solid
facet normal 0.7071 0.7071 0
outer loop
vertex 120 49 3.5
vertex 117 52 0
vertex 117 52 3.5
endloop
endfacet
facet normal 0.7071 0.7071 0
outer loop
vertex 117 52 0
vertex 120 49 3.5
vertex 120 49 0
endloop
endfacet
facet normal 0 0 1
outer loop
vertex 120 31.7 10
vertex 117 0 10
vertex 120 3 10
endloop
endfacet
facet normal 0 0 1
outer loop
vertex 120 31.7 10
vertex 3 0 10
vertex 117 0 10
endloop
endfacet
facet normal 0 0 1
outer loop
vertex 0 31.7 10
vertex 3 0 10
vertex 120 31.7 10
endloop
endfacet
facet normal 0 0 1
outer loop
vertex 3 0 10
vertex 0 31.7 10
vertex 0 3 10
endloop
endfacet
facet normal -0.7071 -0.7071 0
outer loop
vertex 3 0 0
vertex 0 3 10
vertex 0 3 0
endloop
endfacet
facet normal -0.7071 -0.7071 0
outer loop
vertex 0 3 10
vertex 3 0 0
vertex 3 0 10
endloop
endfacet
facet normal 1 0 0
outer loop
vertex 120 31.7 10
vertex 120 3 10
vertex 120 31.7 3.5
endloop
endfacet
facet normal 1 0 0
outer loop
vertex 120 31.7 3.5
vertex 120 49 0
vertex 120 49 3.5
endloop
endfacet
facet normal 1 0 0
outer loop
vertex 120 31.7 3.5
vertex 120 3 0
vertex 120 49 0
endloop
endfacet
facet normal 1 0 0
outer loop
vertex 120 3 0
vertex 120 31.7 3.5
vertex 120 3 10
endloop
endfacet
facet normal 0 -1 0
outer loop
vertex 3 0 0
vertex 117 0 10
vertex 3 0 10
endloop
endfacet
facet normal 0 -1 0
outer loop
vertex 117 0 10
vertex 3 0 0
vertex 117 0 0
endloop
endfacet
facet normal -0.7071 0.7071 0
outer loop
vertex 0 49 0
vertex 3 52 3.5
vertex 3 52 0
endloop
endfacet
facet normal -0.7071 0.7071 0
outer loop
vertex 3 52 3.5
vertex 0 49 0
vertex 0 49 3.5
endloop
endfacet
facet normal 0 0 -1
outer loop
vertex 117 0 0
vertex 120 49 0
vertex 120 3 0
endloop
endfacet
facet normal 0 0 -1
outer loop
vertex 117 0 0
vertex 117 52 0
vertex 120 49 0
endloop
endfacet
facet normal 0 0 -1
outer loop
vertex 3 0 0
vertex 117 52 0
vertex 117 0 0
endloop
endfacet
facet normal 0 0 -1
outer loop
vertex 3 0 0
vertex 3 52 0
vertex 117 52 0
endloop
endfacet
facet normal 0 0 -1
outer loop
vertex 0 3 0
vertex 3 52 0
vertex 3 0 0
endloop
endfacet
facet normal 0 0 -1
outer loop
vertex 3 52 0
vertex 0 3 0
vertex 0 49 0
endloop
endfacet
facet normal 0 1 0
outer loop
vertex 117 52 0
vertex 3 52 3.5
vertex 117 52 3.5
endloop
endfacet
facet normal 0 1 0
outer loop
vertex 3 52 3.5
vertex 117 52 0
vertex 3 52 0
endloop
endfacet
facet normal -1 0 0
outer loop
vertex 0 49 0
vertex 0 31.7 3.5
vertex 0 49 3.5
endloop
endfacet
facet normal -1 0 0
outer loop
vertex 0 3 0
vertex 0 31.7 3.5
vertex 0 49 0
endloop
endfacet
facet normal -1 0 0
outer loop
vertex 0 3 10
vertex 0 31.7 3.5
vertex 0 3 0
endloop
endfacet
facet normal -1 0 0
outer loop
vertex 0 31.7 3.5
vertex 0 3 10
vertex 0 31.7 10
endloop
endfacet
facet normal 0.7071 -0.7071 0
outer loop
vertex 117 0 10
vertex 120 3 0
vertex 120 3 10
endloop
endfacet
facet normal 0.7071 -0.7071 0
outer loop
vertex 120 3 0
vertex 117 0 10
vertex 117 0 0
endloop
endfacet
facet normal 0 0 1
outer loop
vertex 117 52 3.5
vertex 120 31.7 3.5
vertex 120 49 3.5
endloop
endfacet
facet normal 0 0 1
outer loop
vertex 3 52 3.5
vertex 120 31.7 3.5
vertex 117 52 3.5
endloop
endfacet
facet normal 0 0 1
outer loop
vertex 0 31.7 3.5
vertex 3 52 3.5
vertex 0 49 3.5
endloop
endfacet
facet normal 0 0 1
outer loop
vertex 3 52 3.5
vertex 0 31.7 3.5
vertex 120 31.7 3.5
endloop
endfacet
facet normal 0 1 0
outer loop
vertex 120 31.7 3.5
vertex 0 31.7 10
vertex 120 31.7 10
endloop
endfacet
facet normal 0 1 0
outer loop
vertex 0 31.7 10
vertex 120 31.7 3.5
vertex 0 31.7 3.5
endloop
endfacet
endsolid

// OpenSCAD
$fn = 32;

// ----------------------------------------------------------------------
// Stepped bar: sidestep, 120 x 52 x 10/3.5 mm
// ----------------------------------------------------------------------

// --- parameters (mm) ---
bar_l = 120;              // bar length, X
bar_w = 52;               // bar width, Y
plate_t = 10;             // thickness of the thick zone, Z
thin_t = 3.5;             // thickness of the thin zone
corner_c = 3;             // corner chamfer of the bar
step_cut = 6.5;           // material removed from the thin zone
ledge_y = 31.7;           // start of the ledge from the front edge
depth_1 = 6.5;            // depth of cut 1 from the top face
fit_tol = 0.05;           // declared fit tolerance (prompt contract)
free_tol = 0.3;           // declared free tolerance (prompt contract)

profile = [[3, 0], [117, 0], [120, 3], [120, 49], [117, 52], [3, 52], [0, 49], [0, 3]];  // primary outline, 8 points, counter clockwise
void_1 = [[-1, 31.7], [121, 31.7], [121, 53], [-1, 53]];  // ledge cut along one edge, 4 points

// --- the one profile operation ---
difference() {
  linear_extrude(height = plate_t) polygon(points = profile);
  translate([0, 0, plate_t - depth_1])
    linear_extrude(height = depth_1 + 1) polygon(points = void_1);
}
